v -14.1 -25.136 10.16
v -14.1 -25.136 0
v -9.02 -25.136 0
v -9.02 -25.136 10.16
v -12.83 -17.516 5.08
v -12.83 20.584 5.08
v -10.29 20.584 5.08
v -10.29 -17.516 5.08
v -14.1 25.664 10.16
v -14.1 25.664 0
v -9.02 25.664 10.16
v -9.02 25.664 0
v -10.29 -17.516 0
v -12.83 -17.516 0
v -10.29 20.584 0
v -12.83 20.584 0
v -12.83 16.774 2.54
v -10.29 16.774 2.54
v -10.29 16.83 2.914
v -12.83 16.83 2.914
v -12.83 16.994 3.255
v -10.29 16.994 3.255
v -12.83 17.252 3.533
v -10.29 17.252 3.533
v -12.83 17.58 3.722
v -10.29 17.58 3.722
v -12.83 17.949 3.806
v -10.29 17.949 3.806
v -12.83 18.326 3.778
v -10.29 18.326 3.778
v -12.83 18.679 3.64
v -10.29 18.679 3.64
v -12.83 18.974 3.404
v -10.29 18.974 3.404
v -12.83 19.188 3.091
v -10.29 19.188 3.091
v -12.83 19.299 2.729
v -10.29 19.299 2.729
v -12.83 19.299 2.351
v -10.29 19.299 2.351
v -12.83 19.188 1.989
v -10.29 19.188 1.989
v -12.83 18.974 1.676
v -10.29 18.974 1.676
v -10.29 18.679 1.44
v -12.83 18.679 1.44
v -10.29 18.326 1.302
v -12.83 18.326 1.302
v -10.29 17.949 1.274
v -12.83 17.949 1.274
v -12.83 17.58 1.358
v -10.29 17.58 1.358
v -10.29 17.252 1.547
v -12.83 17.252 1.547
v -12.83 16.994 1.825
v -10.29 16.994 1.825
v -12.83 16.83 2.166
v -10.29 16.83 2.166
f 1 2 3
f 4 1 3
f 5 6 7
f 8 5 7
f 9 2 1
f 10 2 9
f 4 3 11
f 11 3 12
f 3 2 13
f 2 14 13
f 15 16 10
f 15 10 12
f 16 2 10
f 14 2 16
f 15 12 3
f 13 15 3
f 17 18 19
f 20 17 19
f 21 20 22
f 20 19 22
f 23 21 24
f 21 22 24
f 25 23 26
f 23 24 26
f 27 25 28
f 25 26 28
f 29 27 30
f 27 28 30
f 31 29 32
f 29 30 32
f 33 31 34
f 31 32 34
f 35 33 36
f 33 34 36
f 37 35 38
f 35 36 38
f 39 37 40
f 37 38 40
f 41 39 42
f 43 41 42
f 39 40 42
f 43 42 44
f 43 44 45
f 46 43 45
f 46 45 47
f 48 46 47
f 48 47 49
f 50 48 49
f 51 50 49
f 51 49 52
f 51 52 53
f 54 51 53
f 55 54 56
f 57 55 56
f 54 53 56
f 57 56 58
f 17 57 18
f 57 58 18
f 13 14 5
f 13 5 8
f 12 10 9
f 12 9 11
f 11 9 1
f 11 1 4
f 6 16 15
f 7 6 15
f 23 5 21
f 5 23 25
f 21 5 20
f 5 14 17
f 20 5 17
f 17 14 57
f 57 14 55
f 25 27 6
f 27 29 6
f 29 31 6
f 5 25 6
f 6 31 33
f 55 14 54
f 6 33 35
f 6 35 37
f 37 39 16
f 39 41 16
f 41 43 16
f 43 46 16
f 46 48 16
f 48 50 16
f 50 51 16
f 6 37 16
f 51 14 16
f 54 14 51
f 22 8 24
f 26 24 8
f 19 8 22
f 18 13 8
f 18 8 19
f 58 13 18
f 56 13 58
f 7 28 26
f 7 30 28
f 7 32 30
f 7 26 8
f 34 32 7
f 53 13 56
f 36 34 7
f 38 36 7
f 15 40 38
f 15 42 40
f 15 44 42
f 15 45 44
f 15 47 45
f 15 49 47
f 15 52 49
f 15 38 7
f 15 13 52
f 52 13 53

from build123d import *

# Parameters (mm, degrees)
F0_W     = 5.08
F0_H     = 50.8
F0_W_2   = 2.54
F0_H_2   = 38.1
F1_DEPTH = 10.16
F2_DEPTH = 5.08
F3_R     = 1.27
F4_DEPTH = 2.54


with BuildPart() as f1:
    # F0 (on Top) → F1 (new body)
    with BuildSketch(Plane.XY):
        with Locations((-11.560145, 0.263519)):
            Rectangle(F0_W, F0_H)
        with Locations((-11.560145, 1.533519)):
            Rectangle(F0_W_2, F0_H_2, mode=Mode.SUBTRACT)
        with Locations((-11.560145, 1.533519)):
            Rectangle(F0_W_2, F0_H_2)
    extrude(amount=F1_DEPTH)

    # F0 (on Top) → F2 (cut)
    with BuildSketch(Plane.XY):
        with Locations((-11.560145, 1.533519)):
            Rectangle(F0_W_2, F0_H_2)
    extrude(amount=F2_DEPTH, mode=Mode.SUBTRACT)

    # F3 (on face) → F4 (join)
    with BuildSketch(Plane(origin=(-10.290145, 0, 0), x_dir=(0, -1, 0), z_dir=(-1, 0, 0))):
        with Locations((-18.043519, 2.54)):
            Circle(F3_R)
    extrude(amount=F4_DEPTH)


solid = f1.part
